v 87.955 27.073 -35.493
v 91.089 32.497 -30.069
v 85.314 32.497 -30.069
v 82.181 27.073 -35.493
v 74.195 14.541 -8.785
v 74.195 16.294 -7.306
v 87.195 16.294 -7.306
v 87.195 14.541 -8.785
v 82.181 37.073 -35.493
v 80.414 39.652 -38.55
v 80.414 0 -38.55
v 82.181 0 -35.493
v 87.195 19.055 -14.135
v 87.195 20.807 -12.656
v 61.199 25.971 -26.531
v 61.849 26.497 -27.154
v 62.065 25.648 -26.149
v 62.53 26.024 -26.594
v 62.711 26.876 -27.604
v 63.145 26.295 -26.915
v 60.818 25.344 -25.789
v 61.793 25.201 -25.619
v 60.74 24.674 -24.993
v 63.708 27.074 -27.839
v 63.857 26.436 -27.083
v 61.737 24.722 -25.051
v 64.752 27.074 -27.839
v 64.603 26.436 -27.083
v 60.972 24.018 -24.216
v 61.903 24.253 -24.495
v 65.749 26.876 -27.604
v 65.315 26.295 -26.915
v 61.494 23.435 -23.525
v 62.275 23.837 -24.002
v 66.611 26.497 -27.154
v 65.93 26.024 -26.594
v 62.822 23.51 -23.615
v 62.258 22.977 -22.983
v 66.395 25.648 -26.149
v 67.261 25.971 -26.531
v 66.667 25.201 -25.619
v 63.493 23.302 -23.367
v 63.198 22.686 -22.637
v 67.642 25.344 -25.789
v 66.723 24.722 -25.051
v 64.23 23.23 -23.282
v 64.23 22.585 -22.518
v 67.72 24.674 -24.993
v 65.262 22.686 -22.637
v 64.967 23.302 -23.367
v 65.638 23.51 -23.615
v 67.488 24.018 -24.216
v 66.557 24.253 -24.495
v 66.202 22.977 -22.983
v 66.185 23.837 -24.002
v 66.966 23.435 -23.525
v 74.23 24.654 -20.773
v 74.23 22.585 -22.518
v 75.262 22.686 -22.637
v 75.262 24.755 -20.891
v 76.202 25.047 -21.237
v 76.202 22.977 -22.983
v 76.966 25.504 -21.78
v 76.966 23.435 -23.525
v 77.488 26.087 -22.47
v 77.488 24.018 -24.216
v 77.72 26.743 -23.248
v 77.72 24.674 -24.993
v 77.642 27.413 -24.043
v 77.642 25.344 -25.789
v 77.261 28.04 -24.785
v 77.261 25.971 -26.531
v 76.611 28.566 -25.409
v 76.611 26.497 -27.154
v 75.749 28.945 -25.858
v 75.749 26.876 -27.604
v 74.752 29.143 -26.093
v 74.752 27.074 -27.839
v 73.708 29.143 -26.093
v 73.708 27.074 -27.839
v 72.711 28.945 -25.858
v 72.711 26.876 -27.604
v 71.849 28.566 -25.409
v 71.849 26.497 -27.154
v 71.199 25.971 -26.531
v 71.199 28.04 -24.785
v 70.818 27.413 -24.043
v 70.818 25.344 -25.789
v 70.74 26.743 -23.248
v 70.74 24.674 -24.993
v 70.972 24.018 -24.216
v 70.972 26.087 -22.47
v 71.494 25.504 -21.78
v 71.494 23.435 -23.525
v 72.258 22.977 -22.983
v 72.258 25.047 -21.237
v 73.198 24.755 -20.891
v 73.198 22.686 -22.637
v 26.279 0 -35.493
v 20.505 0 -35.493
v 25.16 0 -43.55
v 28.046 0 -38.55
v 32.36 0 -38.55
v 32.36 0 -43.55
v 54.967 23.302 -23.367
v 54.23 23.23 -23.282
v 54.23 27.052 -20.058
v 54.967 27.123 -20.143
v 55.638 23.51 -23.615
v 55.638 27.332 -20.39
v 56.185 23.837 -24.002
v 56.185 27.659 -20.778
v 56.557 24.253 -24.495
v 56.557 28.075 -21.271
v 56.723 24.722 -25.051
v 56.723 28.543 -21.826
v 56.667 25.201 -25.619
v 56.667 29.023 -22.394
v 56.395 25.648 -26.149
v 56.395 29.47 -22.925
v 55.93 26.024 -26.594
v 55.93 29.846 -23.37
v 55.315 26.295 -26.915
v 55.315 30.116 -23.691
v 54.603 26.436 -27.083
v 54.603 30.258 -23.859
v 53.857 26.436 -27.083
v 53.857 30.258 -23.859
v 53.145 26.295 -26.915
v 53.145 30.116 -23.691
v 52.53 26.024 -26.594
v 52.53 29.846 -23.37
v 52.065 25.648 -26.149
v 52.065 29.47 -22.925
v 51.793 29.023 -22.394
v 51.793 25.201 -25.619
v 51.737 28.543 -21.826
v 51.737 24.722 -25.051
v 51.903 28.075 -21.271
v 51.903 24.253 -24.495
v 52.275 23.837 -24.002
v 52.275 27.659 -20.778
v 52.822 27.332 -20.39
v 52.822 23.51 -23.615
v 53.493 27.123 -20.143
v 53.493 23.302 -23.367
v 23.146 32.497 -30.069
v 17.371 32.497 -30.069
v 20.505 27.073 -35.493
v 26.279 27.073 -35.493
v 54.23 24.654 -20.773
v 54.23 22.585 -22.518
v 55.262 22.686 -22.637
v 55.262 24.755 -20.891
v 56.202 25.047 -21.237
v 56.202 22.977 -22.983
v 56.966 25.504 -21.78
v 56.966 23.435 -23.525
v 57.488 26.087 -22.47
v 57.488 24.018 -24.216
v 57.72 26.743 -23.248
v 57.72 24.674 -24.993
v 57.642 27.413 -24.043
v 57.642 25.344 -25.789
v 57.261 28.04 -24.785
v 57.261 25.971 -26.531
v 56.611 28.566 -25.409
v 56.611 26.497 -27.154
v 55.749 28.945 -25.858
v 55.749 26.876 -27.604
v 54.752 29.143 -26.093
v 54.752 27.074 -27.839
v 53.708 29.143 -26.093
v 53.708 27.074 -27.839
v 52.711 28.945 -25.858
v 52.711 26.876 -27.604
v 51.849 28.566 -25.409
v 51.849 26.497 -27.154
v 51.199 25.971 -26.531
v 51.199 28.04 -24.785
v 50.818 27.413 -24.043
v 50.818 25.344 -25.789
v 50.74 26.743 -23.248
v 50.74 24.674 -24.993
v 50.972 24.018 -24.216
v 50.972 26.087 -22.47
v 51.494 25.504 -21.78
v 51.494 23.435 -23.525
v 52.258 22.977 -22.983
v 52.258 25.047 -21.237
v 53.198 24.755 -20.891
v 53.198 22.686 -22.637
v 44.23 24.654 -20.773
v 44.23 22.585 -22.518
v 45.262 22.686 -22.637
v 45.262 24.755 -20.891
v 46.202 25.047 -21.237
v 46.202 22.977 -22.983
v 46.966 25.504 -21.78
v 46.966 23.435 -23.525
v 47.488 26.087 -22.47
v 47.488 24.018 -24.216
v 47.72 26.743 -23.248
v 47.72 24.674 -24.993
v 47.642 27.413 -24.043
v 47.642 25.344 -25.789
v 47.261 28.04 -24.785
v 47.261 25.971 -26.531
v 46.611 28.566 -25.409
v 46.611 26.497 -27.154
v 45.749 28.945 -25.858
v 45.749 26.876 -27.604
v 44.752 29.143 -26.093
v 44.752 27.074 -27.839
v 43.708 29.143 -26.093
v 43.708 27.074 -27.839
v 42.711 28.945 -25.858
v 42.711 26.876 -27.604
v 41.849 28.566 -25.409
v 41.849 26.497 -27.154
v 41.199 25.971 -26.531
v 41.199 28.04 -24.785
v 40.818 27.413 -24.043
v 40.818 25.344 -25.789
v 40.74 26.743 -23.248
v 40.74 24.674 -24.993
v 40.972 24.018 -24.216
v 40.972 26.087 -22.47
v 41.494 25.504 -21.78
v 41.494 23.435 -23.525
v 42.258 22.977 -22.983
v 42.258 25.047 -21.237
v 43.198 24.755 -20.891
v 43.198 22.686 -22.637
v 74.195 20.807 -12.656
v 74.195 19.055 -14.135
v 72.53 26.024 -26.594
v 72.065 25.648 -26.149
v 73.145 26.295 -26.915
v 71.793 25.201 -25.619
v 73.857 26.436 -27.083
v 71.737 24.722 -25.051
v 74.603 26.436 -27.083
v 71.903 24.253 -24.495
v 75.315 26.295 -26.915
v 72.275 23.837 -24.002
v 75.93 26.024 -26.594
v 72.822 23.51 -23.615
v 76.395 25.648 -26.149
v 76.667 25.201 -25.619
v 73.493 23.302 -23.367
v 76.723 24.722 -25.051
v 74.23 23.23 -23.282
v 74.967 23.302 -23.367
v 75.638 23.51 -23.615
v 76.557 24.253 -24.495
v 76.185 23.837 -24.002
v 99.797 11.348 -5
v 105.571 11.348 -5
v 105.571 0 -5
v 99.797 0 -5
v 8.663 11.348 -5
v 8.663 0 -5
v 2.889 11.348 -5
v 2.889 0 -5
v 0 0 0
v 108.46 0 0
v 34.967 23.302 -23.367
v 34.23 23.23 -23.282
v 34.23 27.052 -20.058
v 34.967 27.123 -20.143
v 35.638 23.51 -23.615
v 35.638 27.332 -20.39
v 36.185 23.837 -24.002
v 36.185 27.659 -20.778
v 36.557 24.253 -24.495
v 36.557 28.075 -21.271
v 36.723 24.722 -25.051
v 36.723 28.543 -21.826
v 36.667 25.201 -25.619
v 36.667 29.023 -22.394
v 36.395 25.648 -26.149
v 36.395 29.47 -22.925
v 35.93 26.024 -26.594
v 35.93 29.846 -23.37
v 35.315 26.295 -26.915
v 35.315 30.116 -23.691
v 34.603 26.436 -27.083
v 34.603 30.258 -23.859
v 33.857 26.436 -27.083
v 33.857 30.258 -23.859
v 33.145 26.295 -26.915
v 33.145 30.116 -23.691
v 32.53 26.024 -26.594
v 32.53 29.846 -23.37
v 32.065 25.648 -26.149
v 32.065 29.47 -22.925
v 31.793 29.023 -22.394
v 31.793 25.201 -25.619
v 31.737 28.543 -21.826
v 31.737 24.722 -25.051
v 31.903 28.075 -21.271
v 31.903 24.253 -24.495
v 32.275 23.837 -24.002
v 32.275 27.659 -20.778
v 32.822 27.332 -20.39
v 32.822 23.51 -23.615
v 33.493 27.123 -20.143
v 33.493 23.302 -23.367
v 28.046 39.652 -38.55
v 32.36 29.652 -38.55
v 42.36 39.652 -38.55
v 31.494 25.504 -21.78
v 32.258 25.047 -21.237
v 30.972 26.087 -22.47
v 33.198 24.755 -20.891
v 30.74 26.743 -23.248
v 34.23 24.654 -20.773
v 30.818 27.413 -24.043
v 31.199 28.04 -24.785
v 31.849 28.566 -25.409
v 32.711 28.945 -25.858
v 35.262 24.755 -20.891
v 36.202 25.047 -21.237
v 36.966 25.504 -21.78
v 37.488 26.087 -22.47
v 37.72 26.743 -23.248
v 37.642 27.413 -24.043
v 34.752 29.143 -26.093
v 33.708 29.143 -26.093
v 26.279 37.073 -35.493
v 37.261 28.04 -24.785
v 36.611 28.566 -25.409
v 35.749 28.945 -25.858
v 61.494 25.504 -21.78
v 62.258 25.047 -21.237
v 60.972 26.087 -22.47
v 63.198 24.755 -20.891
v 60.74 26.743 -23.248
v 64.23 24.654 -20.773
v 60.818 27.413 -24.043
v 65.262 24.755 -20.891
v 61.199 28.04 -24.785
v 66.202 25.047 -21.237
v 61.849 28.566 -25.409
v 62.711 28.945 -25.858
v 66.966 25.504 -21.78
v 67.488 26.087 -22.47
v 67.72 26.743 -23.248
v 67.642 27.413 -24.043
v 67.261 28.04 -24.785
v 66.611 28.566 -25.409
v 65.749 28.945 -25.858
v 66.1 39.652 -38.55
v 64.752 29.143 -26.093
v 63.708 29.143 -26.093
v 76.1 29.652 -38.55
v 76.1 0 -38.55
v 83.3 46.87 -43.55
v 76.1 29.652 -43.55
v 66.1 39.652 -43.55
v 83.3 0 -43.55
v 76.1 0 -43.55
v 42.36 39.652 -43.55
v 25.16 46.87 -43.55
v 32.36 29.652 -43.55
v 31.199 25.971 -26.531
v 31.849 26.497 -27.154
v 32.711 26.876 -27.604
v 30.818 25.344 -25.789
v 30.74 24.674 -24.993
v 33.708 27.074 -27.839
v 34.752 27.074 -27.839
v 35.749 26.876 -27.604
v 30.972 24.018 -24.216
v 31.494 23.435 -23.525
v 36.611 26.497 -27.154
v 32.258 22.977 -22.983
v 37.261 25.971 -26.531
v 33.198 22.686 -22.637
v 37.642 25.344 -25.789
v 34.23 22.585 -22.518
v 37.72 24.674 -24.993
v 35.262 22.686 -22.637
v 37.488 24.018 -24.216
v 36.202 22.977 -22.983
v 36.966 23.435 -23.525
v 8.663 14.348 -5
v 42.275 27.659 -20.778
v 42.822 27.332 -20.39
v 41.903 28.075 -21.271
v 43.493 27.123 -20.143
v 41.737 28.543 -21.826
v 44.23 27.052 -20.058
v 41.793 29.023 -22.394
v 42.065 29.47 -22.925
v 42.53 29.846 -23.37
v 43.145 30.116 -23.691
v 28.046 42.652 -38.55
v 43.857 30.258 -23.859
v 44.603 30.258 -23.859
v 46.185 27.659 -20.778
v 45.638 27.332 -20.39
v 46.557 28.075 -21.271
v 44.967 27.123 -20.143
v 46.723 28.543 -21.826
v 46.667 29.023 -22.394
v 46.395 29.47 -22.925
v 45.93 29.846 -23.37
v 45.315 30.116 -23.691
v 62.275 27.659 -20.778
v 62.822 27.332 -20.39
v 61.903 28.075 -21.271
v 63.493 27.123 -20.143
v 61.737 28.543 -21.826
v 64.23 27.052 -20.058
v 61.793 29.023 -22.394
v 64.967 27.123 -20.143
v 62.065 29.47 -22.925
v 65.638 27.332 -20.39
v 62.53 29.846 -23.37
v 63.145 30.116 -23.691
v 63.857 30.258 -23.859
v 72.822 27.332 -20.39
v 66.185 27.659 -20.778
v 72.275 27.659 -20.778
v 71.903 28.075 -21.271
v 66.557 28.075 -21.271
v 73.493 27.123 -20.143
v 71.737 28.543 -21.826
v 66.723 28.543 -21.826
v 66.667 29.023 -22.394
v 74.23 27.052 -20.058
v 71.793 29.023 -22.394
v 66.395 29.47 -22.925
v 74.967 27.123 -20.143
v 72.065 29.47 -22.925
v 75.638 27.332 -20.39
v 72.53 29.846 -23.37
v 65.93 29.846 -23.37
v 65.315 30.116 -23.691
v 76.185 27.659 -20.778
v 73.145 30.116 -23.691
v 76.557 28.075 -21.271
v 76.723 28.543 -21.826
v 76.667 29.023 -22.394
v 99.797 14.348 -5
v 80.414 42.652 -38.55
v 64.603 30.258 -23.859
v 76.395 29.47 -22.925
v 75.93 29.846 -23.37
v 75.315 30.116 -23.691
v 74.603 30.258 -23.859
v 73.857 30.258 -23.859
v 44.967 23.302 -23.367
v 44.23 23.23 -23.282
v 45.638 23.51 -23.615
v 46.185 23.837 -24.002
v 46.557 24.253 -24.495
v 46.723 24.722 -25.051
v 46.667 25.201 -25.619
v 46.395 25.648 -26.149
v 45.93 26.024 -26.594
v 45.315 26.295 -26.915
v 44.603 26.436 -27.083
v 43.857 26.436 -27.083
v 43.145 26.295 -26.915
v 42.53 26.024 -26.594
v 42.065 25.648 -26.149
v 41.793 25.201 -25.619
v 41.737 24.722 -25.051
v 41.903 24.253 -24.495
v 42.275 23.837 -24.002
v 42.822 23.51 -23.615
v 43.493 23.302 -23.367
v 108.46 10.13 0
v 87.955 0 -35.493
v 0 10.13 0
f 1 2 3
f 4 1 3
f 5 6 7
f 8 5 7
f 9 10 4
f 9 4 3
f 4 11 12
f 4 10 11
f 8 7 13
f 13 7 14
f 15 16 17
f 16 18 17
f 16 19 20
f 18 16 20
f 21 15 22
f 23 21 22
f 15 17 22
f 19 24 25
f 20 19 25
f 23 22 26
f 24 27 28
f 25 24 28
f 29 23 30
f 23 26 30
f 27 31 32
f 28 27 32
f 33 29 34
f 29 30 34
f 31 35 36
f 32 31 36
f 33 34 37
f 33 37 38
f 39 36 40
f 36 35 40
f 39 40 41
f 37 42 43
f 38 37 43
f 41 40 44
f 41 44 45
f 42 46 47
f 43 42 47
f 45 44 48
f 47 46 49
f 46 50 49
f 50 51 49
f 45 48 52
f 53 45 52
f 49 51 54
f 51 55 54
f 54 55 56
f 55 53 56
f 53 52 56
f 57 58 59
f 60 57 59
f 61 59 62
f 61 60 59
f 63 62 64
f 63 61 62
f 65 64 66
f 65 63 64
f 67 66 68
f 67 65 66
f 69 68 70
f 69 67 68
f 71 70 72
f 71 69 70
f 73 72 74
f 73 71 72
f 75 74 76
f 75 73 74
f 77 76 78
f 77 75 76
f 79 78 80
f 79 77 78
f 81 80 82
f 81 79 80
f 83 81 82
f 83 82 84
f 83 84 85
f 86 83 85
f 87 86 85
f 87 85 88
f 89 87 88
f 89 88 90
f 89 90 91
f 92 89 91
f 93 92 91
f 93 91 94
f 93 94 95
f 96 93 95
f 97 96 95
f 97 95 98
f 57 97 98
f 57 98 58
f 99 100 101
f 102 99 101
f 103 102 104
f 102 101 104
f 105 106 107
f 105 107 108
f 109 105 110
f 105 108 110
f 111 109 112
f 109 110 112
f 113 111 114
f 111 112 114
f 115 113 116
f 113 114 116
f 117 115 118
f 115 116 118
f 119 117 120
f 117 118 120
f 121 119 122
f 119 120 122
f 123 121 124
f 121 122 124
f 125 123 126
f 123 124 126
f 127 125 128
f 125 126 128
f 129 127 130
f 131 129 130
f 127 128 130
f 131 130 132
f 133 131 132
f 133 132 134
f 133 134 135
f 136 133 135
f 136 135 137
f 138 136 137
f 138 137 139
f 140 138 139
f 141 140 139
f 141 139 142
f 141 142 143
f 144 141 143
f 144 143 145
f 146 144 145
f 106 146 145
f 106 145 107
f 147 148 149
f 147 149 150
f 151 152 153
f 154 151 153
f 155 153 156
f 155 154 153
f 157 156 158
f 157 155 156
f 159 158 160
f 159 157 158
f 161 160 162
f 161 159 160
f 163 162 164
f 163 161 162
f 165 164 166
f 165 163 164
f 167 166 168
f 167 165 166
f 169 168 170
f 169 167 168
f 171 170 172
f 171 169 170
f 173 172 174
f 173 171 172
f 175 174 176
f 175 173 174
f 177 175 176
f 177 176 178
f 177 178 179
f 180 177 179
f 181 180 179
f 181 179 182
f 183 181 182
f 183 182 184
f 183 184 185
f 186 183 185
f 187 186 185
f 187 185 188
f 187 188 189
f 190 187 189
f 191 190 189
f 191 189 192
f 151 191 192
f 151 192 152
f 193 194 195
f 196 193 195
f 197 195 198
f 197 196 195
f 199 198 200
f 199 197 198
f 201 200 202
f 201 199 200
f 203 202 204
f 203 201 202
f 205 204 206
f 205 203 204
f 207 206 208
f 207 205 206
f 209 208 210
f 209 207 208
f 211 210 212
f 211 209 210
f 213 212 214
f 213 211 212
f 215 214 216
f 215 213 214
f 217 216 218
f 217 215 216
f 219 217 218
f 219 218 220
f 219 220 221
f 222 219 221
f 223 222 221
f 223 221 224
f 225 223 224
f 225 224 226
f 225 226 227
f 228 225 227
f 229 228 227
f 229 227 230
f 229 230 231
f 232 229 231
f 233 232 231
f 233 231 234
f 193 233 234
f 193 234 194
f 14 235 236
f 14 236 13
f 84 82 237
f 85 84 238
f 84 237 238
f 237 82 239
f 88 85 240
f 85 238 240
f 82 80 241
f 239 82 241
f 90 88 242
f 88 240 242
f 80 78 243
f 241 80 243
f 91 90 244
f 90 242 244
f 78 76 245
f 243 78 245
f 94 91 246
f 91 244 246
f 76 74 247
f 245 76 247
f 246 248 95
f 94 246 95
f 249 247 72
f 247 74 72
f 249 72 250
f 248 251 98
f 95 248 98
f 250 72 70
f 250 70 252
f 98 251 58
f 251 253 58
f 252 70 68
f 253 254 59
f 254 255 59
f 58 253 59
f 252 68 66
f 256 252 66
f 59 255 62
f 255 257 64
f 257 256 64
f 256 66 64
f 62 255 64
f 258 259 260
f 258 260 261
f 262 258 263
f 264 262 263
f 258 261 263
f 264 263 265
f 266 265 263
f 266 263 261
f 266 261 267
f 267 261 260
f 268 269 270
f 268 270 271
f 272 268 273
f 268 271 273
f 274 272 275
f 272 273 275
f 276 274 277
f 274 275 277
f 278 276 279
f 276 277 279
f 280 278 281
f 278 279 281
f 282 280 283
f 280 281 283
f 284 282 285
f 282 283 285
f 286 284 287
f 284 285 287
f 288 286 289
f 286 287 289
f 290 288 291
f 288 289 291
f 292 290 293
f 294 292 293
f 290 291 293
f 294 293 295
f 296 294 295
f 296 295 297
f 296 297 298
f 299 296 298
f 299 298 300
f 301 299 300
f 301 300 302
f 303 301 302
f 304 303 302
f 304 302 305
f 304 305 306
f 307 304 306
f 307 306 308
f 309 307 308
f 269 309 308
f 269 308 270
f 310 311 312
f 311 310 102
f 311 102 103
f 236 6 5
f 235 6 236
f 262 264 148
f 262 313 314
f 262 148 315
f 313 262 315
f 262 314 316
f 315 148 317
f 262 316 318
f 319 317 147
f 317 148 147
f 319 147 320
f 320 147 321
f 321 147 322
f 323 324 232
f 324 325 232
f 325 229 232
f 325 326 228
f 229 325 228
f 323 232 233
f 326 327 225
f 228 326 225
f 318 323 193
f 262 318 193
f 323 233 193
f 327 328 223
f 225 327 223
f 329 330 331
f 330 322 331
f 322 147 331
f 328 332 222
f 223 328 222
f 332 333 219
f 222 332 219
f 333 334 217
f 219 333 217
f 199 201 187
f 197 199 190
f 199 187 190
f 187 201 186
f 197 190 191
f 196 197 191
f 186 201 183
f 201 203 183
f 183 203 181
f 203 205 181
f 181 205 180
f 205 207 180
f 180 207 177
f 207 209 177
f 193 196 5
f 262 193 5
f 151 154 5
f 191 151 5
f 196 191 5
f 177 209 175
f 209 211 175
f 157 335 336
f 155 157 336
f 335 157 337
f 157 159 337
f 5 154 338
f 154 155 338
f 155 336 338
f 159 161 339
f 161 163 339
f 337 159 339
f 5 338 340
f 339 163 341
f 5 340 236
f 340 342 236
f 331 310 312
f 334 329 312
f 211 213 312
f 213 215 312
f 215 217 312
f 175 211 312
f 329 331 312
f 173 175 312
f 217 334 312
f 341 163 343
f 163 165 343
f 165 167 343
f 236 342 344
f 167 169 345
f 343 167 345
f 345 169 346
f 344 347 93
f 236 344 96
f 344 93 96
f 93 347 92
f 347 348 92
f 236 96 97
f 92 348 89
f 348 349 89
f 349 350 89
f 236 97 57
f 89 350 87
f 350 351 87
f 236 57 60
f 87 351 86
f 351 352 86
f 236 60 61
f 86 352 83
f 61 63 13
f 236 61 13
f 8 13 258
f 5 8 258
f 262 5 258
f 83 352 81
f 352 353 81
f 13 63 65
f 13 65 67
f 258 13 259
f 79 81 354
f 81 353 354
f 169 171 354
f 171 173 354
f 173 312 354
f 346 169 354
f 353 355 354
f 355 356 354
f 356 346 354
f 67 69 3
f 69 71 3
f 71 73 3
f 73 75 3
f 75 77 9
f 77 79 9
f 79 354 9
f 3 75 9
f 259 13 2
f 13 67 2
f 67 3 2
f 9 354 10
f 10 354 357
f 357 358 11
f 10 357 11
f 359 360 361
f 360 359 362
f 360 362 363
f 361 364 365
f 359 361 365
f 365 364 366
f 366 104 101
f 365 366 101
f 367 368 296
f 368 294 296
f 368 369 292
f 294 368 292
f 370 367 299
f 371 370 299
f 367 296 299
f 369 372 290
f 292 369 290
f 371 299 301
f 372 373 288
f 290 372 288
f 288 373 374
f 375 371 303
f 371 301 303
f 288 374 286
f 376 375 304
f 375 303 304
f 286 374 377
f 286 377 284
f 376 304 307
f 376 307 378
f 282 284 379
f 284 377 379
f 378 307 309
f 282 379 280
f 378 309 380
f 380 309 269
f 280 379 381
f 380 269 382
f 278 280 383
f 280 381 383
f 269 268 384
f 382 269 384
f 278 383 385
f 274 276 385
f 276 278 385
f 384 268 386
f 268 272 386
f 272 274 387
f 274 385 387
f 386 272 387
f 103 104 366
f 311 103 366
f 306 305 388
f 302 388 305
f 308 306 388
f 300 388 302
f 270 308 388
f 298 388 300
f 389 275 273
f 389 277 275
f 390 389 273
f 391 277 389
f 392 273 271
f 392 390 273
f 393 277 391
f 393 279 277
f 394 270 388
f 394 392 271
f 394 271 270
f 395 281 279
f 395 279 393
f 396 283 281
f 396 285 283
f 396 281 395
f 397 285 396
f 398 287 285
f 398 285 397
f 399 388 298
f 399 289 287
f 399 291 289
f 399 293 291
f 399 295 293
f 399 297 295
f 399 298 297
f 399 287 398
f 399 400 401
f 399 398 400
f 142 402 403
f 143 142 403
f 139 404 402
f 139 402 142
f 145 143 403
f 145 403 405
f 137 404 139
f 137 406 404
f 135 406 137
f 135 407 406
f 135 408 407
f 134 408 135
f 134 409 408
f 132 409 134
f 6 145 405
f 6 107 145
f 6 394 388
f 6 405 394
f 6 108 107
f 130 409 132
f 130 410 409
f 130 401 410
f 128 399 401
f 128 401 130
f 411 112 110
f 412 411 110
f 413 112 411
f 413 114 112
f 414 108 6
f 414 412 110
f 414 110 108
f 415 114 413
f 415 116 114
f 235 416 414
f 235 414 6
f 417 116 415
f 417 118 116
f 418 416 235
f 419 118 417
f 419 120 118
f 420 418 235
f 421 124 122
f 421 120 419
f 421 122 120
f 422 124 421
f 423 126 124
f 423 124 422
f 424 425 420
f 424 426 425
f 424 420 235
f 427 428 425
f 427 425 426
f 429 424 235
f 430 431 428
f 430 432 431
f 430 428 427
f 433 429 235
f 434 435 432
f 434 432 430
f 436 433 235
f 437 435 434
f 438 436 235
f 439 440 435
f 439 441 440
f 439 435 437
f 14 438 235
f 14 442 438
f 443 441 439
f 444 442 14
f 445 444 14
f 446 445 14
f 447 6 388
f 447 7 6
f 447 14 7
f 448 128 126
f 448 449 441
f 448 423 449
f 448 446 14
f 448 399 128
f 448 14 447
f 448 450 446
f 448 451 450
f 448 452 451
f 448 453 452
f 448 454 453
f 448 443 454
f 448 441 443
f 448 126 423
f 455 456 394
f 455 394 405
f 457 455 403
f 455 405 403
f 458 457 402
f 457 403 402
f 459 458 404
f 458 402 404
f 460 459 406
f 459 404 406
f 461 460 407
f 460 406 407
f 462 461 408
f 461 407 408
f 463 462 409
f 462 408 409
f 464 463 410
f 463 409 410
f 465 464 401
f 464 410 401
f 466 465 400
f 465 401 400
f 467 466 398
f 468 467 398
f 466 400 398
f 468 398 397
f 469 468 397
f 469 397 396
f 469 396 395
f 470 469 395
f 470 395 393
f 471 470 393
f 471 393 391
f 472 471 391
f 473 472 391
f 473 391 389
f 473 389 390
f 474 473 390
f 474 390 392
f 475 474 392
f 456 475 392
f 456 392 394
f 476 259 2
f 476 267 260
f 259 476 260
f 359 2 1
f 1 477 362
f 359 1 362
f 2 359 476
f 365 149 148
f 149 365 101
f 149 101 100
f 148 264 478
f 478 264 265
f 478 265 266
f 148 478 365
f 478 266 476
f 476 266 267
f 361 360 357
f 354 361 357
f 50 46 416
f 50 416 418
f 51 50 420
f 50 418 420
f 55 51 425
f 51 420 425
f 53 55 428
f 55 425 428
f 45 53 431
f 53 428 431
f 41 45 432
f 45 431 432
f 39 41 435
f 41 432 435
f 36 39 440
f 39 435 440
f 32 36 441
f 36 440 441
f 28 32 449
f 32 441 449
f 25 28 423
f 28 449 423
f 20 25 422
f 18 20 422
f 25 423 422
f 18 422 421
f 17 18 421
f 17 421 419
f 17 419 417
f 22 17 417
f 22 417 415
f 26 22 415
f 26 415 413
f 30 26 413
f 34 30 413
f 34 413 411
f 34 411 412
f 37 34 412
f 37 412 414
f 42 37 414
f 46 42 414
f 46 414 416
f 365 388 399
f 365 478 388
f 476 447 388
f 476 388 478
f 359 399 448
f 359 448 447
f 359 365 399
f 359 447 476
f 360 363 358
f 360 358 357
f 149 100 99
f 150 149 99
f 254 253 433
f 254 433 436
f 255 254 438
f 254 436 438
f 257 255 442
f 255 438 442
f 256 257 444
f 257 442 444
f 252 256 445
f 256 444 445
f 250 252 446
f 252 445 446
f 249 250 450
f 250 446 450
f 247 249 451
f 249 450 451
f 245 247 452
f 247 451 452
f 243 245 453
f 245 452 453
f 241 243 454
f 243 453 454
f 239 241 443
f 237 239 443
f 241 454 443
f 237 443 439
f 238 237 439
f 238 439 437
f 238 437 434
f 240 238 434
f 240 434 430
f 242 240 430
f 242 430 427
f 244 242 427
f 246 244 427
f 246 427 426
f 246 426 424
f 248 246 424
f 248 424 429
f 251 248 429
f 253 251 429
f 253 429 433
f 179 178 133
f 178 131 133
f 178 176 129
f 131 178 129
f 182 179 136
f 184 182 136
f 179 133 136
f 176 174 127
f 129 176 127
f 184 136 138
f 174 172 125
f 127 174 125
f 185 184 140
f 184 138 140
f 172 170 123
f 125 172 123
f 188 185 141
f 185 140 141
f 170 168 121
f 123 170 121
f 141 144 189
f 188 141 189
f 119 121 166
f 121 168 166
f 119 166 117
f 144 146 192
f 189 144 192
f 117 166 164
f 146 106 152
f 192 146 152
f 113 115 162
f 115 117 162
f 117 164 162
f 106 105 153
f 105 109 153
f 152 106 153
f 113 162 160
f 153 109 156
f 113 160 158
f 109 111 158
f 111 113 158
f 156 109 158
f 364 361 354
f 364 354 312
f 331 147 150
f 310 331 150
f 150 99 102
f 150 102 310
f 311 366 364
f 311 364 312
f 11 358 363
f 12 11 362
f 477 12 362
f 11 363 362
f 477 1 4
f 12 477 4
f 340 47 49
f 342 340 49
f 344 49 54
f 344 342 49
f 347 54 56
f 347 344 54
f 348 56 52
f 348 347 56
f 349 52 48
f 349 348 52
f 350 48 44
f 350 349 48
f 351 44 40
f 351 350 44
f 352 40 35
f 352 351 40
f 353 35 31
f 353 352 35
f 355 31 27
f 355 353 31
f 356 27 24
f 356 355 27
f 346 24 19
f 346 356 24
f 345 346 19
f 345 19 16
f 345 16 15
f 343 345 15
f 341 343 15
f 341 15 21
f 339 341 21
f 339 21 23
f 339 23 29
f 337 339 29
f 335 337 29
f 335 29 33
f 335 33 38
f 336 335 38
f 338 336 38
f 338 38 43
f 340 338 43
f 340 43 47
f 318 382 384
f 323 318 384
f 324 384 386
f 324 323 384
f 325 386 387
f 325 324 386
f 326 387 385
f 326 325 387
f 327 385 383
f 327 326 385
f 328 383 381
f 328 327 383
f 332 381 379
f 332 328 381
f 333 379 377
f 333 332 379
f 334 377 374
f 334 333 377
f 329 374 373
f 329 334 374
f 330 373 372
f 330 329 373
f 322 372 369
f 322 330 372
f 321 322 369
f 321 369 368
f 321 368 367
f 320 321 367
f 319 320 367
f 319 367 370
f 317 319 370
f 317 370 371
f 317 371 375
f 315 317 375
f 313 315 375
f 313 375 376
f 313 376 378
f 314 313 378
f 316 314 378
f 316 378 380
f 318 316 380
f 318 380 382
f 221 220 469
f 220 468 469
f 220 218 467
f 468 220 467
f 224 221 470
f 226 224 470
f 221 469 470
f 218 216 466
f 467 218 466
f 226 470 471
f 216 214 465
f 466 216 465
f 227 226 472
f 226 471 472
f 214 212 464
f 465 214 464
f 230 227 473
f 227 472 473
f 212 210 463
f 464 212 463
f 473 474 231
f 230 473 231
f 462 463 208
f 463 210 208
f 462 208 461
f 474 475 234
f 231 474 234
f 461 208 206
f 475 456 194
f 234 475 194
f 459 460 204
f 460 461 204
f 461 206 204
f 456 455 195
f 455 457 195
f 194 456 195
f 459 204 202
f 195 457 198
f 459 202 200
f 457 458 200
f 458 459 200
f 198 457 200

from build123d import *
from OCP.BRepFilletAPI import BRepFilletAPI_MakeChamfer

# Parameters (mm, degrees)
BOSS_EXTRUDE1_DEPTH = 10.13
BOSS_EXTRUDE2_DEPTH = 36.74
CHAMFER1_SIZE2      = 43.55
CHAMFER1_SIZE       = 36.74
CUT_EXTRUDE1_DEPTH  = 50
BOSS_EXTRUDE3_DEPTH = 3
SKETCH12_W          = 43.74
SKETCH12_H          = 39.651859931
CUT_EXTRUDE2_DEPTH  = 5
CUT_EXTRUDE3_REACH  = 127.686
SKETCH13_R          = 2.5
SKETCH15_R          = 3.5
SKETCH15_R_2        = 2.5
BOSS_EXTRUDE4_DEPTH = 5
CUT_EXTRUDE4_REACH  = 127.686
SKETCH16_W          = 13
SKETCH16_H          = 7
LPATTERN1_COUNT     = 5
LPATTERN1_PITCH     = 10
LPATTERN2_COUNT     = 5
LPATTERN2_PITCH     = 10
CUT_EXTRUDE5_REACH  = 167.082
CHAMFER2_SIZE       = 10
CHAMFER2_SIZE2      = 7.096456913
CHAMFER3_SIZE       = 10


with BuildPart() as part:
    # Sketch1 → Boss-Extrude1 (new body)
    with BuildSketch(Plane(origin=(0, 0, 0), x_dir=(1, 0, 0), z_dir=(0, 1, 0))):
        Polygon((0, 0), (108.46, 0), (83.3, 43.55), (25.16, 43.55), align=None)
    extrude(amount=BOSS_EXTRUDE1_DEPTH)

    # Sketch4 → Boss-Extrude2 (add)
    with BuildSketch(Plane(origin=(0, 10.13, 0), x_dir=(1, 0, 0), z_dir=(0, 1, 0))):
        Polygon((25.16, 43.55), (0, 0), (108.46, 0), (83.3, 43.55), align=None)
    extrude(amount=BOSS_EXTRUDE2_DEPTH)

    # Chamfer1
    chamfer1_edges = [part.edges().sort_by_distance(p)[0] for p in [
        (54.23, 46.87, 0),
    ]]
    chamfer1_side = [part.faces().sort_by_distance(p)[0] for p in [
        (54.23, 46.1352, 0),
    ]]
    chamfer(chamfer1_edges, length=CHAMFER1_SIZE - 0.0001, length2=CHAMFER1_SIZE2 - 0.0001, reference=chamfer1_side[0])  # a hair under: the kernel refuses the full size

    # Sketch10 → Cut-Extrude1 (cut)
    with BuildSketch(Plane.XZ):
        Polygon((8.66307788, -5), (28.045810372, -38.55), (80.414189628, -38.55), (99.79692212, -5), align=None)
    extrude(amount=-CUT_EXTRUDE1_DEPTH, mode=Mode.SUBTRACT)

    # Sketch11 → Boss-Extrude3 (add, along a direction that is not the sketch's normal)
    with BuildSketch(Plane(origin=(0, 5.918064684, 4.992645155), x_dir=(1, 0, 0), z_dir=(0, 0.7643374360351171, 0.6448164730179148))):
        Polygon((8.66307788, 13.073604254), (99.79692212, 13.073604254), (80.414189628, 56.967830048), (28.045810372, 56.967830048), align=None)
    extrude(amount=-BOSS_EXTRUDE3_DEPTH, dir=(0, 1, 0))

    # Sketch12 → Cut-Extrude2 (cut)
    with BuildSketch(Plane(origin=(0, 0, -43.55), x_dir=(-1, 0, 0), z_dir=(0, 0, -1))):
        with Locations((-54.23, 19.825929966)):
            Rectangle(SKETCH12_W, SKETCH12_H)
    extrude(amount=-CUT_EXTRUDE2_DEPTH, mode=Mode.SUBTRACT)

    # Sketch13 → Cut-Extrude3 (cut, up to next)
    with BuildSketch(Plane(origin=(0, 5.918064684, 4.992645155), x_dir=(1, 0, 0), z_dir=(0, 0.7643374360351171, 0.6448164730179148)), mode=Mode.PRIVATE) as cut_extrude3_sk1:
        with Locations(Location((74.23, 35.27486423, 0), (0, 0, 270))):
            Circle(SKETCH13_R)
    cut_extrude3_tool1 = extrude(cut_extrude3_sk1.sketch, amount=-CUT_EXTRUDE3_REACH, mode=Mode.PRIVATE) & part.part
    cut_extrude3 = cut_extrude3_tool1.solids().sort_by_distance((74.23, 28.663878, -21.969254))[0]
    add(cut_extrude3, mode=Mode.SUBTRACT)

    # Sketch15 → Boss-Extrude4 (add)
    with BuildSketch(Plane(origin=(0, 5.918064684, 4.992645155), x_dir=(1, 0, 0), z_dir=(0, 0.7643374360351171, 0.6448164730179148))):
        with Locations(Location((74.23, 35.27486423, 0), (0, 0, 270))):
            Circle(SKETCH15_R)
        with Locations(Location((74.23, 35.27486423, 0), (0, 0, 270))):
            Circle(SKETCH15_R_2, mode=Mode.SUBTRACT)
    boss_extrude4 = extrude(amount=-BOSS_EXTRUDE4_DEPTH)

    # Sketch16 → Cut-Extrude4 (cut, up to next)
    with BuildSketch(Plane(origin=(0, 5.918064684, 4.992645155), x_dir=(1, 0, 0), z_dir=(0, 0.7643374360351172, 0.6448164730179149)), mode=Mode.PRIVATE) as cut_extrude4_sk1:
        with Locations((80.69536615, 19.590719272)):
            Rectangle(SKETCH16_W, SKETCH16_H)
    cut_extrude4_tool1 = extrude(cut_extrude4_sk1.sketch, amount=-CUT_EXTRUDE4_REACH, mode=Mode.PRIVATE) & part.part
    add(cut_extrude4_tool1.solids().sort_by_distance((80.695366, 18.550483, -9.981275))[0], mode=Mode.SUBTRACT)

    # LPattern1: Cut-Extrude3 ×5
    with Locations(*[(-i * LPATTERN1_PITCH, 0, 0) for i in range(1, LPATTERN1_COUNT)]):
        add(cut_extrude3, mode=Mode.SUBTRACT)

    # LPattern2: Boss-Extrude4 ×5
    with Locations(*[(-i * LPATTERN2_PITCH, 0, 0) for i in range(1, LPATTERN2_COUNT)]):
        add(boss_extrude4)

    # Cut-Extrude5: up to this plane
    cut_extrude5_end = Plane(origin=(0, 0, 0), z_dir=(0, -1, 0))
    # Sketch20 → Cut-Extrude5 (cut, up to the surface)
    with BuildSketch(Plane(origin=(0, 4.165429536, 3.514073046), x_dir=(1, 0, 0), z_dir=(0, -0.7643374360351171, -0.644816473017915)), mode=Mode.PRIVATE) as cut_extrude5_sk1:
        Polygon((10.517235303, -11.139154835), (2.034423094, -11.139154835), (19.650842851, -51.033380629), (29.759813719, -51.033380629), align=None)
    cut_extrude5_tool1 = split(extrude(cut_extrude5_sk1.sketch, amount=CUT_EXTRUDE5_REACH, dir=(0, -1, 0), mode=Mode.PRIVATE), bisect_by=cut_extrude5_end, keep=Keep.BOTH, mode=Mode.PRIVATE)
    add(cut_extrude5_tool1.solids().sort_by_distance((15.759239, 24.585372, -20.690839))[0], mode=Mode.SUBTRACT)
    # Sketch20 → Cut-Extrude5 (cut, up to the surface)
    with BuildSketch(Plane(origin=(0, 4.165429536, 3.514073046), x_dir=(1, 0, 0), z_dir=(0, -0.7643374360351171, -0.644816473017915)), mode=Mode.PRIVATE) as cut_extrude5_sk2:
        Polygon((78.700186281, -51.033380629), (97.942764697, -11.139154835), (106.425576906, -11.139154835), (88.809157149, -51.033380629), align=None)
    cut_extrude5_tool2 = split(extrude(cut_extrude5_sk2.sketch, amount=CUT_EXTRUDE5_REACH, dir=(0, -1, 0), mode=Mode.PRIVATE), bisect_by=cut_extrude5_end, keep=Keep.BOTH, mode=Mode.PRIVATE)
    add(cut_extrude5_tool2.solids().sort_by_distance((92.700761, 24.585372, -20.690839))[0], mode=Mode.SUBTRACT)

    # Chamfer2: one chamfer whose edges measure the first distance from different faces: ONE call of the kernel's chamfer builder (chamfer() names one face for all edges)
    chamfer2_edges_1 = [part.edges().sort_by_distance(p)[0] for p in [
        (23.392275575, 37.072594039, -35.492650256),
    ]]
    chamfer2_side_1 = [part.faces().sort_by_distance(p)[0] for p in [
        (23.392275575, 18.53629702, -35.492650256),
    ]]
    chamfer2_edges_2 = [part.edges().sort_by_distance(p)[0] for p in [
        (85.067724425, 37.072594039, -35.492650256),
    ]]
    chamfer2_side_2 = [part.faces().sort_by_distance(p)[0] for p in [
        (85.067724425, 18.53629702, -35.492650256),
    ]]
    chamfer2 = BRepFilletAPI_MakeChamfer(part.part.solid().wrapped)
    for e in chamfer2_edges_1:
        chamfer2.Add(CHAMFER2_SIZE, CHAMFER2_SIZE2, e.wrapped, chamfer2_side_1[0].wrapped)  # the first distance lies on this face
    for e in chamfer2_edges_2:
        chamfer2.Add(CHAMFER2_SIZE, CHAMFER2_SIZE2, e.wrapped, chamfer2_side_2[0].wrapped)  # the first distance lies on this face
    add(Compound.cast(chamfer2.Shape()), mode=Mode.REPLACE)

    # Chamfer3
    chamfer3_edges = [part.edges().sort_by_distance(p)[0] for p in [
        (32.36, 39.651859931, -41.05),
        (76.1, 39.651859931, -41.05),
    ]]
    chamfer(chamfer3_edges, length=CHAMFER3_SIZE)


solid = part.part
